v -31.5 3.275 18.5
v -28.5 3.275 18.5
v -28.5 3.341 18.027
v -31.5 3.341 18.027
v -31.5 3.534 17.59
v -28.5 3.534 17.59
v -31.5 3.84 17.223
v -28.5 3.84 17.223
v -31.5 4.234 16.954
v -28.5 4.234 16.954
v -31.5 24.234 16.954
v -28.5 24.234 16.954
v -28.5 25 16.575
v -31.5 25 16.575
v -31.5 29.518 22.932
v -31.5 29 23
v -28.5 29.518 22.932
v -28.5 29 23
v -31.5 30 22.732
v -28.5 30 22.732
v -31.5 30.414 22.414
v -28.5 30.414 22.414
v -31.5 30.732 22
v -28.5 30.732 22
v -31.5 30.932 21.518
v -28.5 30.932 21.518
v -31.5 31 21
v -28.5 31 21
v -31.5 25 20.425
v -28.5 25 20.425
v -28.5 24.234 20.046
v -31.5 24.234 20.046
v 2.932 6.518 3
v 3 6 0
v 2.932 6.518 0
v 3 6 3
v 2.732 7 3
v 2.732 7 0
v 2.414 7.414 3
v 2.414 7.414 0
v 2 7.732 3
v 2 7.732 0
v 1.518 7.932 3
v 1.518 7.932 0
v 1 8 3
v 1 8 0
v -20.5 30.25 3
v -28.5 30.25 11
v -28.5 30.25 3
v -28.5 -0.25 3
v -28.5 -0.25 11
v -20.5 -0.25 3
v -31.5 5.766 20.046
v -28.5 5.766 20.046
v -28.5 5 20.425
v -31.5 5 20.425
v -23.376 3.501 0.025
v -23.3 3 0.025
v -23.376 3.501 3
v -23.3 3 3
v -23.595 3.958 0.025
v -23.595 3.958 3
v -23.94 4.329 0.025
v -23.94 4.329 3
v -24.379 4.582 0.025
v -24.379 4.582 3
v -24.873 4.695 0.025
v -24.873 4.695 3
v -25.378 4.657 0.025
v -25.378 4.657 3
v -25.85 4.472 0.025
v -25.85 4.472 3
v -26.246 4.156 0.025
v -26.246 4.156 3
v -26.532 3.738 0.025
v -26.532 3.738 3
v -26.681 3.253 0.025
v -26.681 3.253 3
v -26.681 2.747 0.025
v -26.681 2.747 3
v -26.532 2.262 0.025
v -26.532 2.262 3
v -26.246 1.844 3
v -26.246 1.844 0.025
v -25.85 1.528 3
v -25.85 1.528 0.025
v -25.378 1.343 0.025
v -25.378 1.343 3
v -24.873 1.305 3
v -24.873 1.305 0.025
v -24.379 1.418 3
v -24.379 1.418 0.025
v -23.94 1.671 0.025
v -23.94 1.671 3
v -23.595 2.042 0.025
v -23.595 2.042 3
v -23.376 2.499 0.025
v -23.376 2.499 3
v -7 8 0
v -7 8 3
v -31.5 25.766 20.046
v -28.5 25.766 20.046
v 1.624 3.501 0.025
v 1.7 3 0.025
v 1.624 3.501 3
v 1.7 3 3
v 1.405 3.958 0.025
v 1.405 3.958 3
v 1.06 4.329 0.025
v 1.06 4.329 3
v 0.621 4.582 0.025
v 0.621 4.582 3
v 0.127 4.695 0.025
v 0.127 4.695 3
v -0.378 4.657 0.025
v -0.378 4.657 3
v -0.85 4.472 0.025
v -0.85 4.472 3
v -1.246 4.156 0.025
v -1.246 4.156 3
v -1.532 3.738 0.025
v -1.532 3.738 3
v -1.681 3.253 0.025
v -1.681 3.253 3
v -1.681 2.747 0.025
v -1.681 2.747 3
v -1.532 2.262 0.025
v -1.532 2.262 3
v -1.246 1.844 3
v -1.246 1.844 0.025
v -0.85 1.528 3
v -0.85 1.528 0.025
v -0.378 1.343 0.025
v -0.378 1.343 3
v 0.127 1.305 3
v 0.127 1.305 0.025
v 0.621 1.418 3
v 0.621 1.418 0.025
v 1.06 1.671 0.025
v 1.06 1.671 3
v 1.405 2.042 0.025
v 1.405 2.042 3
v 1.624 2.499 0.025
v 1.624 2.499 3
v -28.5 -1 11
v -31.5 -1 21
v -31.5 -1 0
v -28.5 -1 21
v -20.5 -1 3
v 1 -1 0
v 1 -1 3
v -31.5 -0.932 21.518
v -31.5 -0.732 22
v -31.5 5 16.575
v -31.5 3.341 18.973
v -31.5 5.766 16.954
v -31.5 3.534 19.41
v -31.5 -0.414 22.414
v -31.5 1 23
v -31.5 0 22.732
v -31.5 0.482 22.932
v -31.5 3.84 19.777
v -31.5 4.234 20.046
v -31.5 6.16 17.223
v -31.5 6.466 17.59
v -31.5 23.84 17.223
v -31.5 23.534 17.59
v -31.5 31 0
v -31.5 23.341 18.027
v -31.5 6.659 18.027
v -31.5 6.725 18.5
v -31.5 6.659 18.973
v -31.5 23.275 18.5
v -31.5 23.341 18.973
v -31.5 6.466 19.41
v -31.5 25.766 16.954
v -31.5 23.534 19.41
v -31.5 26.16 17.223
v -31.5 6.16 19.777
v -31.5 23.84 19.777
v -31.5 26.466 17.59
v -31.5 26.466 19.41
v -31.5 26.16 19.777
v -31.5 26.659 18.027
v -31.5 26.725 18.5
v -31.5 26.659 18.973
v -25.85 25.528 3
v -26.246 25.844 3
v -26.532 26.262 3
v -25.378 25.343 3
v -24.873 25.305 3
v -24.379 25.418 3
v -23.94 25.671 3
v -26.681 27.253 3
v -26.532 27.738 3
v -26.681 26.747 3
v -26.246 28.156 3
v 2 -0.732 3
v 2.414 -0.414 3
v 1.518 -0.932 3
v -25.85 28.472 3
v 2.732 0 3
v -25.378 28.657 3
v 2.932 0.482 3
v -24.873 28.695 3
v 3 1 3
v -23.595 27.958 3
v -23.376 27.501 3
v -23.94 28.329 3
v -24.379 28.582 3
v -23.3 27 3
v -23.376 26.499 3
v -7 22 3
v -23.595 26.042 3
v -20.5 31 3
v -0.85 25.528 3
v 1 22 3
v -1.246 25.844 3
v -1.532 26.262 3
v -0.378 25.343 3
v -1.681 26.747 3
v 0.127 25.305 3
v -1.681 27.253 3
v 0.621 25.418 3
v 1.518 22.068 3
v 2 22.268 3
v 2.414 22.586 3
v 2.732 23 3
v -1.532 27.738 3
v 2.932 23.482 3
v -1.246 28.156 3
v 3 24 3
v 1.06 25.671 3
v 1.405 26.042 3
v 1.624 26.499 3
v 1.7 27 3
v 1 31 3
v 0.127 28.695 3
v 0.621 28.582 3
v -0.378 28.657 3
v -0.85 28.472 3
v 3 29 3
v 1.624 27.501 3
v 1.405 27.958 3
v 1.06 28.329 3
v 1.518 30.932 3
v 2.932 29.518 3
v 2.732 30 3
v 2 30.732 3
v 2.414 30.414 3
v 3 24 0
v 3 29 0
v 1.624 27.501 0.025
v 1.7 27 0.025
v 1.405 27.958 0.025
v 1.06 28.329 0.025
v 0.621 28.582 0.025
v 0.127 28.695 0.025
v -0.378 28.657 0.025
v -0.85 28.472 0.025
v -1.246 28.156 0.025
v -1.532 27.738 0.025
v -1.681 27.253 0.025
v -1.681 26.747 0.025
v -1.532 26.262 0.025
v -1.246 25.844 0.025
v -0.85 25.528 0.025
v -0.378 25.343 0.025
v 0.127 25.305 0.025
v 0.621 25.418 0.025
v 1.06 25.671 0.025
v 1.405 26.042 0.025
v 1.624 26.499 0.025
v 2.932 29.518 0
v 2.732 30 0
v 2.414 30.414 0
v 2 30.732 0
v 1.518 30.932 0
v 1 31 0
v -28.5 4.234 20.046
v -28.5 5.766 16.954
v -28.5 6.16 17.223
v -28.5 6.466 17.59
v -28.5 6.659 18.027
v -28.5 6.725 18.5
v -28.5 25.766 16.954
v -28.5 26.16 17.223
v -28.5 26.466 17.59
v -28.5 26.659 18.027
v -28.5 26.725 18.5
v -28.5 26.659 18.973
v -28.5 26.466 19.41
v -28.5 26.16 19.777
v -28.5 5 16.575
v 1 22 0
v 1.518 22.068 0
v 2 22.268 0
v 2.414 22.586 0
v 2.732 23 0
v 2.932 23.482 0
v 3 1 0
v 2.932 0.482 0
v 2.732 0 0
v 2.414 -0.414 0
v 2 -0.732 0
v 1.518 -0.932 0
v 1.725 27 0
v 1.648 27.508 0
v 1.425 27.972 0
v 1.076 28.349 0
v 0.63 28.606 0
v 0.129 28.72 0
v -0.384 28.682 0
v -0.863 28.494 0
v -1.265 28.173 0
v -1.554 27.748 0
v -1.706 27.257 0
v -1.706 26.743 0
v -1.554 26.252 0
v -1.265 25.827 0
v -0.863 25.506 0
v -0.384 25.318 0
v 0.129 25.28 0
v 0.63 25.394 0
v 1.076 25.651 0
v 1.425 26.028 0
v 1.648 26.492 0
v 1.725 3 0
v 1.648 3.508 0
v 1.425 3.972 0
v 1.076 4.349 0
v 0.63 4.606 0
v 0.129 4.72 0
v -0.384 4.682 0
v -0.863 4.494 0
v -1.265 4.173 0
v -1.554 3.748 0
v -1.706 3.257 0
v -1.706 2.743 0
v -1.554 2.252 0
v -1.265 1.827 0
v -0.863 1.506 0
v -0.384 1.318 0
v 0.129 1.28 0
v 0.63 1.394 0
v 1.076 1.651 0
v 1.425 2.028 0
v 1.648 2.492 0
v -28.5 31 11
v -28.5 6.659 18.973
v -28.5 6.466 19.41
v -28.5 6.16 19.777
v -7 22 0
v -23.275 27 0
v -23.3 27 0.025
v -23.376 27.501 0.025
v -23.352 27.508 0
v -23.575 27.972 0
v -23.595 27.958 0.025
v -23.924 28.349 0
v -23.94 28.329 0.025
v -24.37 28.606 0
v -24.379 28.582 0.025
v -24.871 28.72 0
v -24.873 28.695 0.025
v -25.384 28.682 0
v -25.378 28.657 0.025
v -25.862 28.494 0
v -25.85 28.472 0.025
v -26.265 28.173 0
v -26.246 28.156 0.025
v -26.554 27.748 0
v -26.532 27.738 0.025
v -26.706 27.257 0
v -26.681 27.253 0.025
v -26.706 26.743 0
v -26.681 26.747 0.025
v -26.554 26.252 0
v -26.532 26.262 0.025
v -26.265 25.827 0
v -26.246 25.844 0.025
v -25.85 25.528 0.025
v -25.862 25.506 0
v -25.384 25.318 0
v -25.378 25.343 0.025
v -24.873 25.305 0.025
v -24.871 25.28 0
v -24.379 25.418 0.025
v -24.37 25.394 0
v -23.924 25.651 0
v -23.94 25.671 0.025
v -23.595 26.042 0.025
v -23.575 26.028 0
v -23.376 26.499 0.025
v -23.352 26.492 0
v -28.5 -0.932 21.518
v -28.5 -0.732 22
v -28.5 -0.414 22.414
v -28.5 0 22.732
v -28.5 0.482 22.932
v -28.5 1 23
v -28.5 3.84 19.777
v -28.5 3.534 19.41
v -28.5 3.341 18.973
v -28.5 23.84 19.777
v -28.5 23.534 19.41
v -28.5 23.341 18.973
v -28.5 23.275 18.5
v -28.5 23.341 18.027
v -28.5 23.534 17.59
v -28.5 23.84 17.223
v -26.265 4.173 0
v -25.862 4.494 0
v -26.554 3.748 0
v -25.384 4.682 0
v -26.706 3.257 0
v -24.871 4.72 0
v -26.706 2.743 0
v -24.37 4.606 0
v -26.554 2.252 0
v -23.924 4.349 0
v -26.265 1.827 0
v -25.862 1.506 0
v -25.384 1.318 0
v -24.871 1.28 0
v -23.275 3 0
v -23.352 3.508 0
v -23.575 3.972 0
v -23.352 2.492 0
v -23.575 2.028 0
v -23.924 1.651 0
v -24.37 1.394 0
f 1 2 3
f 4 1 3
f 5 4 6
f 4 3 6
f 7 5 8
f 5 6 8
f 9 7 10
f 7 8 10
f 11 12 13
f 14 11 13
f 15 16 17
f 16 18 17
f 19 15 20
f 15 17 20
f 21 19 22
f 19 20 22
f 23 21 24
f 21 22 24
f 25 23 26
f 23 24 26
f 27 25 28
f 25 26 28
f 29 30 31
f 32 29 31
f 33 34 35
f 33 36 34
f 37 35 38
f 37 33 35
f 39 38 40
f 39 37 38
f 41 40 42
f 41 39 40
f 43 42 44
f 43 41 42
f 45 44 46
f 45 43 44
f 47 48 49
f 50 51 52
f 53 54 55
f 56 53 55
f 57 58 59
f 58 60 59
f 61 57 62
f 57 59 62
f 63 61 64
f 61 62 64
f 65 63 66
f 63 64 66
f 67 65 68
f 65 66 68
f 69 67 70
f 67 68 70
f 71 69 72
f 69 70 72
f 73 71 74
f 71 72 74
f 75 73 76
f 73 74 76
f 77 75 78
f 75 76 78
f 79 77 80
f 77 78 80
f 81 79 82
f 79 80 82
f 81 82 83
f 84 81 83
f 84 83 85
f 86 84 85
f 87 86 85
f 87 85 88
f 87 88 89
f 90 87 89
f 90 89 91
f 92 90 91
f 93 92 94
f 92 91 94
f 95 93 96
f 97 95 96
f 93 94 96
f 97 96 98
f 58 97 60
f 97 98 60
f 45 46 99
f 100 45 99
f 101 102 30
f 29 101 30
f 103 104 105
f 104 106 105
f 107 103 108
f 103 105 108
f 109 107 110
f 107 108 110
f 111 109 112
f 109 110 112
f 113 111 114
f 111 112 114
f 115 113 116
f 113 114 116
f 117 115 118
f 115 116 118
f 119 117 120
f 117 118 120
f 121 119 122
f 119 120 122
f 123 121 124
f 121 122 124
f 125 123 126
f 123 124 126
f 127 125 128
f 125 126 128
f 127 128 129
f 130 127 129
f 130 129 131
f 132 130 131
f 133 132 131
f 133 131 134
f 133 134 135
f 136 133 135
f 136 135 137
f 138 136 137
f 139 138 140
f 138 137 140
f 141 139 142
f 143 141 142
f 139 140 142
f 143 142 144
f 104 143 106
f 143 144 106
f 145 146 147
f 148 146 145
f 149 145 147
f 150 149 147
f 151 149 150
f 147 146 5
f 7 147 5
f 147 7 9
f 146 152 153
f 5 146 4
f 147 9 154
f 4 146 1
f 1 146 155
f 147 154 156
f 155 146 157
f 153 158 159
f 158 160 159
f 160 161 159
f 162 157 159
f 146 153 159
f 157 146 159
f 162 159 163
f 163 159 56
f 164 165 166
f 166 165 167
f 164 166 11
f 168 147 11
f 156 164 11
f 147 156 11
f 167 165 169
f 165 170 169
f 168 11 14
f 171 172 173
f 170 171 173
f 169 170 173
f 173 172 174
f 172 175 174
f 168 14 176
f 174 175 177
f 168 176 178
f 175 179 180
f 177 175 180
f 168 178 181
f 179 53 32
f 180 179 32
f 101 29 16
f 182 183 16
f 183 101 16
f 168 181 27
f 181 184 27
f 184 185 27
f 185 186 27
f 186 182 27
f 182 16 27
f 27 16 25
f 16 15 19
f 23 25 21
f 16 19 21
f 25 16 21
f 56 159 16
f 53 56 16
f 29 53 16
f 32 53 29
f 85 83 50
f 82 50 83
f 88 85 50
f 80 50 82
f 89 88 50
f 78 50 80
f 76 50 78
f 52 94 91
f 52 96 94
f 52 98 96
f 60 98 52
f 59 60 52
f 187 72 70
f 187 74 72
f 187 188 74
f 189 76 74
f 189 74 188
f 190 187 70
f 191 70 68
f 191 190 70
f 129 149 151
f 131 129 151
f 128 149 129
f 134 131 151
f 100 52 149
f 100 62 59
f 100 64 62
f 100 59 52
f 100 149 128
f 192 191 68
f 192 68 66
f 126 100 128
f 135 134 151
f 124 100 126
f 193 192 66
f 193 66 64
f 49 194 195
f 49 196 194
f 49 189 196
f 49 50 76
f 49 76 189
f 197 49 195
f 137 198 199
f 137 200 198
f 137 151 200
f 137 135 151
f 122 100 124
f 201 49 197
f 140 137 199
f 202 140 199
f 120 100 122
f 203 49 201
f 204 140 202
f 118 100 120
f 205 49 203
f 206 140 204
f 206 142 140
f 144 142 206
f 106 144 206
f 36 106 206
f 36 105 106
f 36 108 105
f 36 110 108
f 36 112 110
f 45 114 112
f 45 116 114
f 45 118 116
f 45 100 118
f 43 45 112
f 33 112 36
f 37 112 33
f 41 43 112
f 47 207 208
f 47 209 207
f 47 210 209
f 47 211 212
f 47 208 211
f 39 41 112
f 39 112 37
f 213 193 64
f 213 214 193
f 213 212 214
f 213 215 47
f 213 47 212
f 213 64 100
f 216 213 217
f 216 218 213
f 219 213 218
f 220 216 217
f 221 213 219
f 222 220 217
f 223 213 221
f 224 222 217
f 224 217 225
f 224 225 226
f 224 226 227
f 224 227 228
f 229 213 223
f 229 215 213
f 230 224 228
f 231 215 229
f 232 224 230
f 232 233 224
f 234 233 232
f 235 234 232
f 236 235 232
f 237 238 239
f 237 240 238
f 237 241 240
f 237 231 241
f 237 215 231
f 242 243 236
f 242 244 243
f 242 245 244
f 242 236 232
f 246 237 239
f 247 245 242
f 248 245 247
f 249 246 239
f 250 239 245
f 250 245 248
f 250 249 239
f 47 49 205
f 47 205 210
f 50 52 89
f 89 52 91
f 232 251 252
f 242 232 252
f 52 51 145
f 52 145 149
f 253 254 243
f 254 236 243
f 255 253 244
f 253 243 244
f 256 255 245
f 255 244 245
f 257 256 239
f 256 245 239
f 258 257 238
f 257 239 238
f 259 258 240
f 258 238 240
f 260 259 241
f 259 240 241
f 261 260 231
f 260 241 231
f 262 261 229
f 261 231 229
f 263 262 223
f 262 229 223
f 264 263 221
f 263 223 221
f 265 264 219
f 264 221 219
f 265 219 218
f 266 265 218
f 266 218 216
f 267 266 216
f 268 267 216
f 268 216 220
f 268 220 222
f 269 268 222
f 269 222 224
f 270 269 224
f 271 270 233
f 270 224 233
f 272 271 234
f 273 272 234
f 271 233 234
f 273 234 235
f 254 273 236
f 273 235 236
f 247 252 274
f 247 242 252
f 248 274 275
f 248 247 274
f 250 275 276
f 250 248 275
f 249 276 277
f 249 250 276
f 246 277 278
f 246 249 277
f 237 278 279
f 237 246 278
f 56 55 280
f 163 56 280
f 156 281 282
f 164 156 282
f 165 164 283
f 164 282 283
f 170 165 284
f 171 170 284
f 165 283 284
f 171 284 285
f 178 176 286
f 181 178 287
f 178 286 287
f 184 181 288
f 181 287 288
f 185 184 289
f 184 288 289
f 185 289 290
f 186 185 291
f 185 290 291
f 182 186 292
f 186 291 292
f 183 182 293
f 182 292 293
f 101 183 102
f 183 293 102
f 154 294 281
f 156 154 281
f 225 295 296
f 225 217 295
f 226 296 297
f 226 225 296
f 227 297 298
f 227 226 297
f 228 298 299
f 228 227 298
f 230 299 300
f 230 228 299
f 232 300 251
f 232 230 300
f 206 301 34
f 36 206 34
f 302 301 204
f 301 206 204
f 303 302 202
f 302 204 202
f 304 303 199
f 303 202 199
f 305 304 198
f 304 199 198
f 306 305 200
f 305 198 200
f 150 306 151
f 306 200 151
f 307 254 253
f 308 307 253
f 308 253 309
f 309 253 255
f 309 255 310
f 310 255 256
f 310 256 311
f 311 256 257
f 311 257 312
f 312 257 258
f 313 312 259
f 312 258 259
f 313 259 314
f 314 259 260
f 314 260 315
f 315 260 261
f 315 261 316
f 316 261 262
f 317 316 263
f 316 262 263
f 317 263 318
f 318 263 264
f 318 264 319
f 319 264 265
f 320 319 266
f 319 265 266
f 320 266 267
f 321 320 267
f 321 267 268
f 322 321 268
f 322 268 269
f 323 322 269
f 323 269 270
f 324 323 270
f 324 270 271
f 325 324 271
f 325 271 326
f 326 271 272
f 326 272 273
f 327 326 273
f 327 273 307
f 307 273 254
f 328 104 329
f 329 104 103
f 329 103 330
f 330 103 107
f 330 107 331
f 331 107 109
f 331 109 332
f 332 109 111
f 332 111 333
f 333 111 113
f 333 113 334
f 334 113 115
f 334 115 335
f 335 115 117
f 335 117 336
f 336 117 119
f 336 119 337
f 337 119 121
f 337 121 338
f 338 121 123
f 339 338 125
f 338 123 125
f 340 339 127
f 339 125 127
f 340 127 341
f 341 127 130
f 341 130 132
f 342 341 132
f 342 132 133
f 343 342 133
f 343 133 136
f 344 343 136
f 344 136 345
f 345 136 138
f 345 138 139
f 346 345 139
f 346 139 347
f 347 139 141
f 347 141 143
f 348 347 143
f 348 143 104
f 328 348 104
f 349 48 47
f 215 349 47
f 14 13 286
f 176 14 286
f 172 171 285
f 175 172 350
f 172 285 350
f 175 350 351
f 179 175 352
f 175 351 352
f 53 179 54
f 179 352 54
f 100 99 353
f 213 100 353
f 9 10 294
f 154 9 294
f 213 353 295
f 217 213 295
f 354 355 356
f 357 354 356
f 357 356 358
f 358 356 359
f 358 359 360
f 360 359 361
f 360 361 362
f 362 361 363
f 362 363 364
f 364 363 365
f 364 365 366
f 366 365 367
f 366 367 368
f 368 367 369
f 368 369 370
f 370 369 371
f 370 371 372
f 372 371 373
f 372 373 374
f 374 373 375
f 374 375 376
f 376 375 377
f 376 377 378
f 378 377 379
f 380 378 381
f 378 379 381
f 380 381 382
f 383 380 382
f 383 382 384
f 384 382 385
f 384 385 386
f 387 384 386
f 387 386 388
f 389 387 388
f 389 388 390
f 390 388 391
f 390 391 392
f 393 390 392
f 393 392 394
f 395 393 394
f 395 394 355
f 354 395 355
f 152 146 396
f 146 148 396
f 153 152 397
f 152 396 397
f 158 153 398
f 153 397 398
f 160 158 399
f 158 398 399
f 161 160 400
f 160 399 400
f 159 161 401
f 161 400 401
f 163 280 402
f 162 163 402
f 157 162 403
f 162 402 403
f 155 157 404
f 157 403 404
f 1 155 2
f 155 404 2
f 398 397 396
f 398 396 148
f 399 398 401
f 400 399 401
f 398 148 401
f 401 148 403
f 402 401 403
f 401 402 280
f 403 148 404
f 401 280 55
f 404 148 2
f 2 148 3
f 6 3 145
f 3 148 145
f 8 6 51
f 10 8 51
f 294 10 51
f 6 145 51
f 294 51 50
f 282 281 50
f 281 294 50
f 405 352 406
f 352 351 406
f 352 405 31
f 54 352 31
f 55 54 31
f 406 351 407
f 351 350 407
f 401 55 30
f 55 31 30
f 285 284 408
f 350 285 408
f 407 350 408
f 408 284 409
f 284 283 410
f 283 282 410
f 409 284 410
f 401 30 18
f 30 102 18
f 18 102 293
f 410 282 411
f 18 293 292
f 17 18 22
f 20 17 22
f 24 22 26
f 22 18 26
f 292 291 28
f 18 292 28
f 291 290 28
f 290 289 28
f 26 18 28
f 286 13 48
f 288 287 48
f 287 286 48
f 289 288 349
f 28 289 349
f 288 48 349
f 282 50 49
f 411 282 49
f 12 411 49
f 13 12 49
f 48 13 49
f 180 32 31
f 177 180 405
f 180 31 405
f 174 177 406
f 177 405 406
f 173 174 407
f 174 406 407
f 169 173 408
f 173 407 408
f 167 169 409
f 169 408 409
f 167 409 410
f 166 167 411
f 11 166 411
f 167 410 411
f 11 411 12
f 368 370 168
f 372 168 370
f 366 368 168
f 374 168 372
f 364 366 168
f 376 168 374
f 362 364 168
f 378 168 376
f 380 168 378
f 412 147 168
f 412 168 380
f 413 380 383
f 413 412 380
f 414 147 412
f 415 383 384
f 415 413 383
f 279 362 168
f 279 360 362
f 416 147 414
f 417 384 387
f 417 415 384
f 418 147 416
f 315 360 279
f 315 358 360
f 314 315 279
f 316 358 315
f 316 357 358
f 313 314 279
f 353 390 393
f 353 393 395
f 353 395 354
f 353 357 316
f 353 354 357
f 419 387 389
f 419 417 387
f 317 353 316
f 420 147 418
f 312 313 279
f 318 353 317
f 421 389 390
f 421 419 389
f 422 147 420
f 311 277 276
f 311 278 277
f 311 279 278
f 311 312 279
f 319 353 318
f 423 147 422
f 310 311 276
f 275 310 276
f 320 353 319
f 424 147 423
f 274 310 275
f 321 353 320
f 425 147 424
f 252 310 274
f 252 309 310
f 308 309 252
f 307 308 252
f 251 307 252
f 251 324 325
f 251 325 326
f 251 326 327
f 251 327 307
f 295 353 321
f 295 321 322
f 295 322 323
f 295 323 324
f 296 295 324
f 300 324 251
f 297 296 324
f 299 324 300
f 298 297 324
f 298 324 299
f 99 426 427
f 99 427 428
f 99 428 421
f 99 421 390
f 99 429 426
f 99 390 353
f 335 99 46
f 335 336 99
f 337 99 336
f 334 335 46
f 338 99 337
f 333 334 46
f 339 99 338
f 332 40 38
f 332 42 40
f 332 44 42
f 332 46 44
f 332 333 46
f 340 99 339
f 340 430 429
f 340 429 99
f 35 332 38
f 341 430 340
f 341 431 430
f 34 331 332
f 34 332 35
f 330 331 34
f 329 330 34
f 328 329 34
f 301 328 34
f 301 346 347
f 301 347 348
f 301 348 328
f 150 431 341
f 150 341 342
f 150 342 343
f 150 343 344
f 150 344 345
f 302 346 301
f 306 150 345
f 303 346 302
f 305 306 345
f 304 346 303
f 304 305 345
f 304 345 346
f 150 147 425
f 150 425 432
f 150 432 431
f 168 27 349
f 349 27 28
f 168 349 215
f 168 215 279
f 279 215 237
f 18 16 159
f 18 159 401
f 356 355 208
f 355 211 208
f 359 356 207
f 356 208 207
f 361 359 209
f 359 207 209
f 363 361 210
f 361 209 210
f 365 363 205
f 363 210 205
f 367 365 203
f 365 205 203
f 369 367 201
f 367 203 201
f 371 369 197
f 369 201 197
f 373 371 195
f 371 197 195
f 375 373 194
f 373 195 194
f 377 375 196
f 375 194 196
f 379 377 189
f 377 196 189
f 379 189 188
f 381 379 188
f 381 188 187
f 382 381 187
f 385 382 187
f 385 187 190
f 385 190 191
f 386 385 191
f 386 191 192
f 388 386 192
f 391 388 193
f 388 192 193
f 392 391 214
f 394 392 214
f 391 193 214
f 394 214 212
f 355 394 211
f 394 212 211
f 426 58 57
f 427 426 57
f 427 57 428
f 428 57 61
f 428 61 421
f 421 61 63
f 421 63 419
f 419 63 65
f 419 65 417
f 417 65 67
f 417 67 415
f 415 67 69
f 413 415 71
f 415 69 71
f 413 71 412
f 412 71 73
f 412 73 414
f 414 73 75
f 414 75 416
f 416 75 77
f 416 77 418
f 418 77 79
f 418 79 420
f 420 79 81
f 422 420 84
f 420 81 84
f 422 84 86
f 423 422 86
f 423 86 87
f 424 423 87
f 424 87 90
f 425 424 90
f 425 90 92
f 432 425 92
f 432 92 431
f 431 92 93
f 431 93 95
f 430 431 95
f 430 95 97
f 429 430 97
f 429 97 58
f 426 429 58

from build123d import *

# Parameters (mm, degrees)
BOSS_EXTRUDE1_DEPTH             = 3
M3_CLEARANCE_HOLE1_D            = 3.4
M3_CLEARANCE_HOLE1_CSINK_D      = 3.45
M3_CLEARANCE_HOLE1_CSINK_ANGLE  = 90
SKETCH7_W                       = 3
SKETCH7_H                       = 32
BOSS_EXTRUDE2_DEPTH             = 20
BOSS_EXTRUDE2_DIRECTION_2_REACH = 45.943
M3_CLEARANCE_HOLE2_D            = 3.4
M3_CLEARANCE_HOLE2_CSINK_D      = 3.45
M3_CLEARANCE_HOLE2_CSINK_ANGLE  = 90
FILLET1_R                       = 2
RIB1_REACH                      = 52.45
SKETCH11_WALL_W                 = 114.21465002
SKETCH11_WALL_H                 = 0.75
SKETCH12_R                      = 1.725
CUT_EXTRUDE1_DEPTH              = 50.822183814


with BuildPart() as part:
    # Sketch2 → Boss-Extrude1 (new body)
    with BuildSketch(Plane.XY):
        Polygon((3, 31), (-31, 31), (-31, -1), (3, -1), (3, 8), (-7, 8), (-7, 22), (3, 22), align=None)
    extrude(amount=BOSS_EXTRUDE1_DEPTH)

    # M3 Clearance Hole1 (through all)
    with Locations(Plane(origin=(0, 0, 0), x_dir=(-1, 0, 0), z_dir=(0, 0, -1))):
        with Locations((25, 3), (25, 27), (0, 27), (0, 3)):
            CounterSinkHole(M3_CLEARANCE_HOLE1_D / 2, M3_CLEARANCE_HOLE1_CSINK_D / 2, counter_sink_angle=M3_CLEARANCE_HOLE1_CSINK_ANGLE)

    # Sketch7 → Boss-Extrude2 (add)
    with BuildSketch(Plane.XY.offset(3)):
        with Locations((-30, 15)):
            Rectangle(SKETCH7_W, SKETCH7_H)
    extrude(amount=BOSS_EXTRUDE2_DEPTH)

    # Boss-Extrude2 direction 2: up to this face of the body (flat: up to its plane)
    boss_extrude2_direction_2_end = Plane(part.part.faces().sort_by_distance((-15.906518225, 15, 0))[0])
    # Sketch7 → Boss-Extrude2 direction 2 (add, up to the picked face)
    with BuildSketch(Plane.XY.offset(3), mode=Mode.PRIVATE) as boss_extrude2_direction_2_sk1:
        with Locations((-30, 15)):
            Rectangle(SKETCH7_W, SKETCH7_H)
    boss_extrude2_direction_2_tool1 = split(extrude(boss_extrude2_direction_2_sk1.sketch, amount=-BOSS_EXTRUDE2_DIRECTION_2_REACH, mode=Mode.PRIVATE), bisect_by=boss_extrude2_direction_2_end, keep=Keep.BOTH, mode=Mode.PRIVATE)
    add(boss_extrude2_direction_2_tool1.solids().sort_by(Axis((-30, 15, 3), (0, 0, -1)))[0])

    # M3 Clearance Hole2 (through all)
    with Locations(Plane(origin=(-28.5, 27.5, 0), x_dir=(0, -1, 0), z_dir=(1, 0, 0))):
        with Locations((22.5, -18.5), (2.5, -18.5)):
            CounterSinkHole(M3_CLEARANCE_HOLE2_D / 2, M3_CLEARANCE_HOLE2_CSINK_D / 2, counter_sink_angle=M3_CLEARANCE_HOLE2_CSINK_ANGLE)

    # Fillet1
    fillet1_edges = [part.edges().sort_by_distance(p)[0] for p in [
        (3, 8, 1.5),
        (3, -1, 1.5),
        (3, 31, 1.5),
        (3, 22, 1.5),
        (-30, 31, 23),
        (-30, -1, 23),
    ]]
    fillet(fillet1_edges, radius=FILLET1_R)

    # Sketch11 wall → Rib1 (add, up to next)
    with BuildSketch(Plane(origin=(-24.5, -1, 7), x_dir=(0.707106781187, 0, -0.707106781187), z_dir=(0.707106781187, 0, 0.707106781187)), mode=Mode.PRIVATE) as rib1_sk1:
        with Locations((0, 0.375)):
            Rectangle(SKETCH11_WALL_W, SKETCH11_WALL_H)
    rib1_tool1 = extrude(rib1_sk1.sketch, amount=-RIB1_REACH, mode=Mode.PRIVATE) - part.part
    rib1 = rib1_tool1.solids().sort_by_distance((-24.5, -1, 7))[0]
    add(rib1)

    # Mirror1: Rib1 across plane
    add(rib1.mirror(Plane.ZX.offset(15)))

    # Sketch12 → Cut-Extrude1 (cut, through all)
    with BuildSketch(Plane(origin=(-28.5, 0, 0), x_dir=(0, 0, -1), z_dir=(1, 0, 0))):
        with BuildLine():
            Line((-20.425, 5), (-20.045779221, 4.234368496))
            ThreePointArc((-20.045779221, 4.234368496), (-20.225, 5), (-20.045779221, 5.765631504))
            Line((-20.045779221, 5.765631504), (-20.425, 5))
        make_face()
        with BuildLine():
            ThreePointArc((-16.775, 5), (-16.820402704, 4.606836011), (-16.954220779, 4.234368496))
            Line((-16.954220779, 4.234368496), (-16.575, 5))
            Line((-16.575, 5), (-16.954220779, 5.765631504))
            ThreePointArc((-16.954220779, 5.765631504), (-16.820402704, 5.393163989), (-16.775, 5))
        make_face()
        with BuildLine():
            ThreePointArc((-16.775, 25), (-16.820402704, 24.606836011), (-16.954220779, 24.234368496))
            Line((-16.954220779, 24.234368496), (-16.575, 25))
            Line((-16.575, 25), (-16.954220779, 25.765631504))
            ThreePointArc((-16.954220779, 25.765631504), (-16.820402704, 25.393163989), (-16.775, 25))
        make_face()
        with BuildLine():
            Line((-20.425, 25), (-20.045779221, 24.234368496))
            ThreePointArc((-20.045779221, 24.234368496), (-20.225, 25), (-20.045779221, 25.765631504))
            Line((-20.045779221, 25.765631504), (-20.425, 25))
        make_face()
        with Locations((-18.5, 25)):
            Circle(SKETCH12_R)
        with BuildLine():
            ThreePointArc((-20.045779221, 5.765631504), (-20.225, 5), (-20.045779221, 4.234368496))
            ThreePointArc((-20.045779221, 4.234368496), (-19.409645715, 3.534336439), (-18.5, 3.275))
            Line((-18.5, 3.275), (-18.5, 6.725))
            ThreePointArc((-18.5, 6.725), (-19.409645715, 6.465663561), (-20.045779221, 5.765631504))
        make_face()
        with BuildLine():
            Line((-18.5, 6.725), (-18.5, 3.275))
            ThreePointArc((-18.5, 3.275), (-17.590354285, 3.534336439), (-16.954220779, 4.234368496))
            ThreePointArc((-16.954220779, 4.234368496), (-16.820402704, 4.606836011), (-16.775, 5))
            ThreePointArc((-16.775, 5), (-16.820402704, 5.393163989), (-16.954220779, 5.765631504))
            ThreePointArc((-16.954220779, 5.765631504), (-17.590354285, 6.465663561), (-18.5, 6.725))
        make_face()
    extrude(amount=-CUT_EXTRUDE1_DEPTH, mode=Mode.SUBTRACT)


solid = part.part
